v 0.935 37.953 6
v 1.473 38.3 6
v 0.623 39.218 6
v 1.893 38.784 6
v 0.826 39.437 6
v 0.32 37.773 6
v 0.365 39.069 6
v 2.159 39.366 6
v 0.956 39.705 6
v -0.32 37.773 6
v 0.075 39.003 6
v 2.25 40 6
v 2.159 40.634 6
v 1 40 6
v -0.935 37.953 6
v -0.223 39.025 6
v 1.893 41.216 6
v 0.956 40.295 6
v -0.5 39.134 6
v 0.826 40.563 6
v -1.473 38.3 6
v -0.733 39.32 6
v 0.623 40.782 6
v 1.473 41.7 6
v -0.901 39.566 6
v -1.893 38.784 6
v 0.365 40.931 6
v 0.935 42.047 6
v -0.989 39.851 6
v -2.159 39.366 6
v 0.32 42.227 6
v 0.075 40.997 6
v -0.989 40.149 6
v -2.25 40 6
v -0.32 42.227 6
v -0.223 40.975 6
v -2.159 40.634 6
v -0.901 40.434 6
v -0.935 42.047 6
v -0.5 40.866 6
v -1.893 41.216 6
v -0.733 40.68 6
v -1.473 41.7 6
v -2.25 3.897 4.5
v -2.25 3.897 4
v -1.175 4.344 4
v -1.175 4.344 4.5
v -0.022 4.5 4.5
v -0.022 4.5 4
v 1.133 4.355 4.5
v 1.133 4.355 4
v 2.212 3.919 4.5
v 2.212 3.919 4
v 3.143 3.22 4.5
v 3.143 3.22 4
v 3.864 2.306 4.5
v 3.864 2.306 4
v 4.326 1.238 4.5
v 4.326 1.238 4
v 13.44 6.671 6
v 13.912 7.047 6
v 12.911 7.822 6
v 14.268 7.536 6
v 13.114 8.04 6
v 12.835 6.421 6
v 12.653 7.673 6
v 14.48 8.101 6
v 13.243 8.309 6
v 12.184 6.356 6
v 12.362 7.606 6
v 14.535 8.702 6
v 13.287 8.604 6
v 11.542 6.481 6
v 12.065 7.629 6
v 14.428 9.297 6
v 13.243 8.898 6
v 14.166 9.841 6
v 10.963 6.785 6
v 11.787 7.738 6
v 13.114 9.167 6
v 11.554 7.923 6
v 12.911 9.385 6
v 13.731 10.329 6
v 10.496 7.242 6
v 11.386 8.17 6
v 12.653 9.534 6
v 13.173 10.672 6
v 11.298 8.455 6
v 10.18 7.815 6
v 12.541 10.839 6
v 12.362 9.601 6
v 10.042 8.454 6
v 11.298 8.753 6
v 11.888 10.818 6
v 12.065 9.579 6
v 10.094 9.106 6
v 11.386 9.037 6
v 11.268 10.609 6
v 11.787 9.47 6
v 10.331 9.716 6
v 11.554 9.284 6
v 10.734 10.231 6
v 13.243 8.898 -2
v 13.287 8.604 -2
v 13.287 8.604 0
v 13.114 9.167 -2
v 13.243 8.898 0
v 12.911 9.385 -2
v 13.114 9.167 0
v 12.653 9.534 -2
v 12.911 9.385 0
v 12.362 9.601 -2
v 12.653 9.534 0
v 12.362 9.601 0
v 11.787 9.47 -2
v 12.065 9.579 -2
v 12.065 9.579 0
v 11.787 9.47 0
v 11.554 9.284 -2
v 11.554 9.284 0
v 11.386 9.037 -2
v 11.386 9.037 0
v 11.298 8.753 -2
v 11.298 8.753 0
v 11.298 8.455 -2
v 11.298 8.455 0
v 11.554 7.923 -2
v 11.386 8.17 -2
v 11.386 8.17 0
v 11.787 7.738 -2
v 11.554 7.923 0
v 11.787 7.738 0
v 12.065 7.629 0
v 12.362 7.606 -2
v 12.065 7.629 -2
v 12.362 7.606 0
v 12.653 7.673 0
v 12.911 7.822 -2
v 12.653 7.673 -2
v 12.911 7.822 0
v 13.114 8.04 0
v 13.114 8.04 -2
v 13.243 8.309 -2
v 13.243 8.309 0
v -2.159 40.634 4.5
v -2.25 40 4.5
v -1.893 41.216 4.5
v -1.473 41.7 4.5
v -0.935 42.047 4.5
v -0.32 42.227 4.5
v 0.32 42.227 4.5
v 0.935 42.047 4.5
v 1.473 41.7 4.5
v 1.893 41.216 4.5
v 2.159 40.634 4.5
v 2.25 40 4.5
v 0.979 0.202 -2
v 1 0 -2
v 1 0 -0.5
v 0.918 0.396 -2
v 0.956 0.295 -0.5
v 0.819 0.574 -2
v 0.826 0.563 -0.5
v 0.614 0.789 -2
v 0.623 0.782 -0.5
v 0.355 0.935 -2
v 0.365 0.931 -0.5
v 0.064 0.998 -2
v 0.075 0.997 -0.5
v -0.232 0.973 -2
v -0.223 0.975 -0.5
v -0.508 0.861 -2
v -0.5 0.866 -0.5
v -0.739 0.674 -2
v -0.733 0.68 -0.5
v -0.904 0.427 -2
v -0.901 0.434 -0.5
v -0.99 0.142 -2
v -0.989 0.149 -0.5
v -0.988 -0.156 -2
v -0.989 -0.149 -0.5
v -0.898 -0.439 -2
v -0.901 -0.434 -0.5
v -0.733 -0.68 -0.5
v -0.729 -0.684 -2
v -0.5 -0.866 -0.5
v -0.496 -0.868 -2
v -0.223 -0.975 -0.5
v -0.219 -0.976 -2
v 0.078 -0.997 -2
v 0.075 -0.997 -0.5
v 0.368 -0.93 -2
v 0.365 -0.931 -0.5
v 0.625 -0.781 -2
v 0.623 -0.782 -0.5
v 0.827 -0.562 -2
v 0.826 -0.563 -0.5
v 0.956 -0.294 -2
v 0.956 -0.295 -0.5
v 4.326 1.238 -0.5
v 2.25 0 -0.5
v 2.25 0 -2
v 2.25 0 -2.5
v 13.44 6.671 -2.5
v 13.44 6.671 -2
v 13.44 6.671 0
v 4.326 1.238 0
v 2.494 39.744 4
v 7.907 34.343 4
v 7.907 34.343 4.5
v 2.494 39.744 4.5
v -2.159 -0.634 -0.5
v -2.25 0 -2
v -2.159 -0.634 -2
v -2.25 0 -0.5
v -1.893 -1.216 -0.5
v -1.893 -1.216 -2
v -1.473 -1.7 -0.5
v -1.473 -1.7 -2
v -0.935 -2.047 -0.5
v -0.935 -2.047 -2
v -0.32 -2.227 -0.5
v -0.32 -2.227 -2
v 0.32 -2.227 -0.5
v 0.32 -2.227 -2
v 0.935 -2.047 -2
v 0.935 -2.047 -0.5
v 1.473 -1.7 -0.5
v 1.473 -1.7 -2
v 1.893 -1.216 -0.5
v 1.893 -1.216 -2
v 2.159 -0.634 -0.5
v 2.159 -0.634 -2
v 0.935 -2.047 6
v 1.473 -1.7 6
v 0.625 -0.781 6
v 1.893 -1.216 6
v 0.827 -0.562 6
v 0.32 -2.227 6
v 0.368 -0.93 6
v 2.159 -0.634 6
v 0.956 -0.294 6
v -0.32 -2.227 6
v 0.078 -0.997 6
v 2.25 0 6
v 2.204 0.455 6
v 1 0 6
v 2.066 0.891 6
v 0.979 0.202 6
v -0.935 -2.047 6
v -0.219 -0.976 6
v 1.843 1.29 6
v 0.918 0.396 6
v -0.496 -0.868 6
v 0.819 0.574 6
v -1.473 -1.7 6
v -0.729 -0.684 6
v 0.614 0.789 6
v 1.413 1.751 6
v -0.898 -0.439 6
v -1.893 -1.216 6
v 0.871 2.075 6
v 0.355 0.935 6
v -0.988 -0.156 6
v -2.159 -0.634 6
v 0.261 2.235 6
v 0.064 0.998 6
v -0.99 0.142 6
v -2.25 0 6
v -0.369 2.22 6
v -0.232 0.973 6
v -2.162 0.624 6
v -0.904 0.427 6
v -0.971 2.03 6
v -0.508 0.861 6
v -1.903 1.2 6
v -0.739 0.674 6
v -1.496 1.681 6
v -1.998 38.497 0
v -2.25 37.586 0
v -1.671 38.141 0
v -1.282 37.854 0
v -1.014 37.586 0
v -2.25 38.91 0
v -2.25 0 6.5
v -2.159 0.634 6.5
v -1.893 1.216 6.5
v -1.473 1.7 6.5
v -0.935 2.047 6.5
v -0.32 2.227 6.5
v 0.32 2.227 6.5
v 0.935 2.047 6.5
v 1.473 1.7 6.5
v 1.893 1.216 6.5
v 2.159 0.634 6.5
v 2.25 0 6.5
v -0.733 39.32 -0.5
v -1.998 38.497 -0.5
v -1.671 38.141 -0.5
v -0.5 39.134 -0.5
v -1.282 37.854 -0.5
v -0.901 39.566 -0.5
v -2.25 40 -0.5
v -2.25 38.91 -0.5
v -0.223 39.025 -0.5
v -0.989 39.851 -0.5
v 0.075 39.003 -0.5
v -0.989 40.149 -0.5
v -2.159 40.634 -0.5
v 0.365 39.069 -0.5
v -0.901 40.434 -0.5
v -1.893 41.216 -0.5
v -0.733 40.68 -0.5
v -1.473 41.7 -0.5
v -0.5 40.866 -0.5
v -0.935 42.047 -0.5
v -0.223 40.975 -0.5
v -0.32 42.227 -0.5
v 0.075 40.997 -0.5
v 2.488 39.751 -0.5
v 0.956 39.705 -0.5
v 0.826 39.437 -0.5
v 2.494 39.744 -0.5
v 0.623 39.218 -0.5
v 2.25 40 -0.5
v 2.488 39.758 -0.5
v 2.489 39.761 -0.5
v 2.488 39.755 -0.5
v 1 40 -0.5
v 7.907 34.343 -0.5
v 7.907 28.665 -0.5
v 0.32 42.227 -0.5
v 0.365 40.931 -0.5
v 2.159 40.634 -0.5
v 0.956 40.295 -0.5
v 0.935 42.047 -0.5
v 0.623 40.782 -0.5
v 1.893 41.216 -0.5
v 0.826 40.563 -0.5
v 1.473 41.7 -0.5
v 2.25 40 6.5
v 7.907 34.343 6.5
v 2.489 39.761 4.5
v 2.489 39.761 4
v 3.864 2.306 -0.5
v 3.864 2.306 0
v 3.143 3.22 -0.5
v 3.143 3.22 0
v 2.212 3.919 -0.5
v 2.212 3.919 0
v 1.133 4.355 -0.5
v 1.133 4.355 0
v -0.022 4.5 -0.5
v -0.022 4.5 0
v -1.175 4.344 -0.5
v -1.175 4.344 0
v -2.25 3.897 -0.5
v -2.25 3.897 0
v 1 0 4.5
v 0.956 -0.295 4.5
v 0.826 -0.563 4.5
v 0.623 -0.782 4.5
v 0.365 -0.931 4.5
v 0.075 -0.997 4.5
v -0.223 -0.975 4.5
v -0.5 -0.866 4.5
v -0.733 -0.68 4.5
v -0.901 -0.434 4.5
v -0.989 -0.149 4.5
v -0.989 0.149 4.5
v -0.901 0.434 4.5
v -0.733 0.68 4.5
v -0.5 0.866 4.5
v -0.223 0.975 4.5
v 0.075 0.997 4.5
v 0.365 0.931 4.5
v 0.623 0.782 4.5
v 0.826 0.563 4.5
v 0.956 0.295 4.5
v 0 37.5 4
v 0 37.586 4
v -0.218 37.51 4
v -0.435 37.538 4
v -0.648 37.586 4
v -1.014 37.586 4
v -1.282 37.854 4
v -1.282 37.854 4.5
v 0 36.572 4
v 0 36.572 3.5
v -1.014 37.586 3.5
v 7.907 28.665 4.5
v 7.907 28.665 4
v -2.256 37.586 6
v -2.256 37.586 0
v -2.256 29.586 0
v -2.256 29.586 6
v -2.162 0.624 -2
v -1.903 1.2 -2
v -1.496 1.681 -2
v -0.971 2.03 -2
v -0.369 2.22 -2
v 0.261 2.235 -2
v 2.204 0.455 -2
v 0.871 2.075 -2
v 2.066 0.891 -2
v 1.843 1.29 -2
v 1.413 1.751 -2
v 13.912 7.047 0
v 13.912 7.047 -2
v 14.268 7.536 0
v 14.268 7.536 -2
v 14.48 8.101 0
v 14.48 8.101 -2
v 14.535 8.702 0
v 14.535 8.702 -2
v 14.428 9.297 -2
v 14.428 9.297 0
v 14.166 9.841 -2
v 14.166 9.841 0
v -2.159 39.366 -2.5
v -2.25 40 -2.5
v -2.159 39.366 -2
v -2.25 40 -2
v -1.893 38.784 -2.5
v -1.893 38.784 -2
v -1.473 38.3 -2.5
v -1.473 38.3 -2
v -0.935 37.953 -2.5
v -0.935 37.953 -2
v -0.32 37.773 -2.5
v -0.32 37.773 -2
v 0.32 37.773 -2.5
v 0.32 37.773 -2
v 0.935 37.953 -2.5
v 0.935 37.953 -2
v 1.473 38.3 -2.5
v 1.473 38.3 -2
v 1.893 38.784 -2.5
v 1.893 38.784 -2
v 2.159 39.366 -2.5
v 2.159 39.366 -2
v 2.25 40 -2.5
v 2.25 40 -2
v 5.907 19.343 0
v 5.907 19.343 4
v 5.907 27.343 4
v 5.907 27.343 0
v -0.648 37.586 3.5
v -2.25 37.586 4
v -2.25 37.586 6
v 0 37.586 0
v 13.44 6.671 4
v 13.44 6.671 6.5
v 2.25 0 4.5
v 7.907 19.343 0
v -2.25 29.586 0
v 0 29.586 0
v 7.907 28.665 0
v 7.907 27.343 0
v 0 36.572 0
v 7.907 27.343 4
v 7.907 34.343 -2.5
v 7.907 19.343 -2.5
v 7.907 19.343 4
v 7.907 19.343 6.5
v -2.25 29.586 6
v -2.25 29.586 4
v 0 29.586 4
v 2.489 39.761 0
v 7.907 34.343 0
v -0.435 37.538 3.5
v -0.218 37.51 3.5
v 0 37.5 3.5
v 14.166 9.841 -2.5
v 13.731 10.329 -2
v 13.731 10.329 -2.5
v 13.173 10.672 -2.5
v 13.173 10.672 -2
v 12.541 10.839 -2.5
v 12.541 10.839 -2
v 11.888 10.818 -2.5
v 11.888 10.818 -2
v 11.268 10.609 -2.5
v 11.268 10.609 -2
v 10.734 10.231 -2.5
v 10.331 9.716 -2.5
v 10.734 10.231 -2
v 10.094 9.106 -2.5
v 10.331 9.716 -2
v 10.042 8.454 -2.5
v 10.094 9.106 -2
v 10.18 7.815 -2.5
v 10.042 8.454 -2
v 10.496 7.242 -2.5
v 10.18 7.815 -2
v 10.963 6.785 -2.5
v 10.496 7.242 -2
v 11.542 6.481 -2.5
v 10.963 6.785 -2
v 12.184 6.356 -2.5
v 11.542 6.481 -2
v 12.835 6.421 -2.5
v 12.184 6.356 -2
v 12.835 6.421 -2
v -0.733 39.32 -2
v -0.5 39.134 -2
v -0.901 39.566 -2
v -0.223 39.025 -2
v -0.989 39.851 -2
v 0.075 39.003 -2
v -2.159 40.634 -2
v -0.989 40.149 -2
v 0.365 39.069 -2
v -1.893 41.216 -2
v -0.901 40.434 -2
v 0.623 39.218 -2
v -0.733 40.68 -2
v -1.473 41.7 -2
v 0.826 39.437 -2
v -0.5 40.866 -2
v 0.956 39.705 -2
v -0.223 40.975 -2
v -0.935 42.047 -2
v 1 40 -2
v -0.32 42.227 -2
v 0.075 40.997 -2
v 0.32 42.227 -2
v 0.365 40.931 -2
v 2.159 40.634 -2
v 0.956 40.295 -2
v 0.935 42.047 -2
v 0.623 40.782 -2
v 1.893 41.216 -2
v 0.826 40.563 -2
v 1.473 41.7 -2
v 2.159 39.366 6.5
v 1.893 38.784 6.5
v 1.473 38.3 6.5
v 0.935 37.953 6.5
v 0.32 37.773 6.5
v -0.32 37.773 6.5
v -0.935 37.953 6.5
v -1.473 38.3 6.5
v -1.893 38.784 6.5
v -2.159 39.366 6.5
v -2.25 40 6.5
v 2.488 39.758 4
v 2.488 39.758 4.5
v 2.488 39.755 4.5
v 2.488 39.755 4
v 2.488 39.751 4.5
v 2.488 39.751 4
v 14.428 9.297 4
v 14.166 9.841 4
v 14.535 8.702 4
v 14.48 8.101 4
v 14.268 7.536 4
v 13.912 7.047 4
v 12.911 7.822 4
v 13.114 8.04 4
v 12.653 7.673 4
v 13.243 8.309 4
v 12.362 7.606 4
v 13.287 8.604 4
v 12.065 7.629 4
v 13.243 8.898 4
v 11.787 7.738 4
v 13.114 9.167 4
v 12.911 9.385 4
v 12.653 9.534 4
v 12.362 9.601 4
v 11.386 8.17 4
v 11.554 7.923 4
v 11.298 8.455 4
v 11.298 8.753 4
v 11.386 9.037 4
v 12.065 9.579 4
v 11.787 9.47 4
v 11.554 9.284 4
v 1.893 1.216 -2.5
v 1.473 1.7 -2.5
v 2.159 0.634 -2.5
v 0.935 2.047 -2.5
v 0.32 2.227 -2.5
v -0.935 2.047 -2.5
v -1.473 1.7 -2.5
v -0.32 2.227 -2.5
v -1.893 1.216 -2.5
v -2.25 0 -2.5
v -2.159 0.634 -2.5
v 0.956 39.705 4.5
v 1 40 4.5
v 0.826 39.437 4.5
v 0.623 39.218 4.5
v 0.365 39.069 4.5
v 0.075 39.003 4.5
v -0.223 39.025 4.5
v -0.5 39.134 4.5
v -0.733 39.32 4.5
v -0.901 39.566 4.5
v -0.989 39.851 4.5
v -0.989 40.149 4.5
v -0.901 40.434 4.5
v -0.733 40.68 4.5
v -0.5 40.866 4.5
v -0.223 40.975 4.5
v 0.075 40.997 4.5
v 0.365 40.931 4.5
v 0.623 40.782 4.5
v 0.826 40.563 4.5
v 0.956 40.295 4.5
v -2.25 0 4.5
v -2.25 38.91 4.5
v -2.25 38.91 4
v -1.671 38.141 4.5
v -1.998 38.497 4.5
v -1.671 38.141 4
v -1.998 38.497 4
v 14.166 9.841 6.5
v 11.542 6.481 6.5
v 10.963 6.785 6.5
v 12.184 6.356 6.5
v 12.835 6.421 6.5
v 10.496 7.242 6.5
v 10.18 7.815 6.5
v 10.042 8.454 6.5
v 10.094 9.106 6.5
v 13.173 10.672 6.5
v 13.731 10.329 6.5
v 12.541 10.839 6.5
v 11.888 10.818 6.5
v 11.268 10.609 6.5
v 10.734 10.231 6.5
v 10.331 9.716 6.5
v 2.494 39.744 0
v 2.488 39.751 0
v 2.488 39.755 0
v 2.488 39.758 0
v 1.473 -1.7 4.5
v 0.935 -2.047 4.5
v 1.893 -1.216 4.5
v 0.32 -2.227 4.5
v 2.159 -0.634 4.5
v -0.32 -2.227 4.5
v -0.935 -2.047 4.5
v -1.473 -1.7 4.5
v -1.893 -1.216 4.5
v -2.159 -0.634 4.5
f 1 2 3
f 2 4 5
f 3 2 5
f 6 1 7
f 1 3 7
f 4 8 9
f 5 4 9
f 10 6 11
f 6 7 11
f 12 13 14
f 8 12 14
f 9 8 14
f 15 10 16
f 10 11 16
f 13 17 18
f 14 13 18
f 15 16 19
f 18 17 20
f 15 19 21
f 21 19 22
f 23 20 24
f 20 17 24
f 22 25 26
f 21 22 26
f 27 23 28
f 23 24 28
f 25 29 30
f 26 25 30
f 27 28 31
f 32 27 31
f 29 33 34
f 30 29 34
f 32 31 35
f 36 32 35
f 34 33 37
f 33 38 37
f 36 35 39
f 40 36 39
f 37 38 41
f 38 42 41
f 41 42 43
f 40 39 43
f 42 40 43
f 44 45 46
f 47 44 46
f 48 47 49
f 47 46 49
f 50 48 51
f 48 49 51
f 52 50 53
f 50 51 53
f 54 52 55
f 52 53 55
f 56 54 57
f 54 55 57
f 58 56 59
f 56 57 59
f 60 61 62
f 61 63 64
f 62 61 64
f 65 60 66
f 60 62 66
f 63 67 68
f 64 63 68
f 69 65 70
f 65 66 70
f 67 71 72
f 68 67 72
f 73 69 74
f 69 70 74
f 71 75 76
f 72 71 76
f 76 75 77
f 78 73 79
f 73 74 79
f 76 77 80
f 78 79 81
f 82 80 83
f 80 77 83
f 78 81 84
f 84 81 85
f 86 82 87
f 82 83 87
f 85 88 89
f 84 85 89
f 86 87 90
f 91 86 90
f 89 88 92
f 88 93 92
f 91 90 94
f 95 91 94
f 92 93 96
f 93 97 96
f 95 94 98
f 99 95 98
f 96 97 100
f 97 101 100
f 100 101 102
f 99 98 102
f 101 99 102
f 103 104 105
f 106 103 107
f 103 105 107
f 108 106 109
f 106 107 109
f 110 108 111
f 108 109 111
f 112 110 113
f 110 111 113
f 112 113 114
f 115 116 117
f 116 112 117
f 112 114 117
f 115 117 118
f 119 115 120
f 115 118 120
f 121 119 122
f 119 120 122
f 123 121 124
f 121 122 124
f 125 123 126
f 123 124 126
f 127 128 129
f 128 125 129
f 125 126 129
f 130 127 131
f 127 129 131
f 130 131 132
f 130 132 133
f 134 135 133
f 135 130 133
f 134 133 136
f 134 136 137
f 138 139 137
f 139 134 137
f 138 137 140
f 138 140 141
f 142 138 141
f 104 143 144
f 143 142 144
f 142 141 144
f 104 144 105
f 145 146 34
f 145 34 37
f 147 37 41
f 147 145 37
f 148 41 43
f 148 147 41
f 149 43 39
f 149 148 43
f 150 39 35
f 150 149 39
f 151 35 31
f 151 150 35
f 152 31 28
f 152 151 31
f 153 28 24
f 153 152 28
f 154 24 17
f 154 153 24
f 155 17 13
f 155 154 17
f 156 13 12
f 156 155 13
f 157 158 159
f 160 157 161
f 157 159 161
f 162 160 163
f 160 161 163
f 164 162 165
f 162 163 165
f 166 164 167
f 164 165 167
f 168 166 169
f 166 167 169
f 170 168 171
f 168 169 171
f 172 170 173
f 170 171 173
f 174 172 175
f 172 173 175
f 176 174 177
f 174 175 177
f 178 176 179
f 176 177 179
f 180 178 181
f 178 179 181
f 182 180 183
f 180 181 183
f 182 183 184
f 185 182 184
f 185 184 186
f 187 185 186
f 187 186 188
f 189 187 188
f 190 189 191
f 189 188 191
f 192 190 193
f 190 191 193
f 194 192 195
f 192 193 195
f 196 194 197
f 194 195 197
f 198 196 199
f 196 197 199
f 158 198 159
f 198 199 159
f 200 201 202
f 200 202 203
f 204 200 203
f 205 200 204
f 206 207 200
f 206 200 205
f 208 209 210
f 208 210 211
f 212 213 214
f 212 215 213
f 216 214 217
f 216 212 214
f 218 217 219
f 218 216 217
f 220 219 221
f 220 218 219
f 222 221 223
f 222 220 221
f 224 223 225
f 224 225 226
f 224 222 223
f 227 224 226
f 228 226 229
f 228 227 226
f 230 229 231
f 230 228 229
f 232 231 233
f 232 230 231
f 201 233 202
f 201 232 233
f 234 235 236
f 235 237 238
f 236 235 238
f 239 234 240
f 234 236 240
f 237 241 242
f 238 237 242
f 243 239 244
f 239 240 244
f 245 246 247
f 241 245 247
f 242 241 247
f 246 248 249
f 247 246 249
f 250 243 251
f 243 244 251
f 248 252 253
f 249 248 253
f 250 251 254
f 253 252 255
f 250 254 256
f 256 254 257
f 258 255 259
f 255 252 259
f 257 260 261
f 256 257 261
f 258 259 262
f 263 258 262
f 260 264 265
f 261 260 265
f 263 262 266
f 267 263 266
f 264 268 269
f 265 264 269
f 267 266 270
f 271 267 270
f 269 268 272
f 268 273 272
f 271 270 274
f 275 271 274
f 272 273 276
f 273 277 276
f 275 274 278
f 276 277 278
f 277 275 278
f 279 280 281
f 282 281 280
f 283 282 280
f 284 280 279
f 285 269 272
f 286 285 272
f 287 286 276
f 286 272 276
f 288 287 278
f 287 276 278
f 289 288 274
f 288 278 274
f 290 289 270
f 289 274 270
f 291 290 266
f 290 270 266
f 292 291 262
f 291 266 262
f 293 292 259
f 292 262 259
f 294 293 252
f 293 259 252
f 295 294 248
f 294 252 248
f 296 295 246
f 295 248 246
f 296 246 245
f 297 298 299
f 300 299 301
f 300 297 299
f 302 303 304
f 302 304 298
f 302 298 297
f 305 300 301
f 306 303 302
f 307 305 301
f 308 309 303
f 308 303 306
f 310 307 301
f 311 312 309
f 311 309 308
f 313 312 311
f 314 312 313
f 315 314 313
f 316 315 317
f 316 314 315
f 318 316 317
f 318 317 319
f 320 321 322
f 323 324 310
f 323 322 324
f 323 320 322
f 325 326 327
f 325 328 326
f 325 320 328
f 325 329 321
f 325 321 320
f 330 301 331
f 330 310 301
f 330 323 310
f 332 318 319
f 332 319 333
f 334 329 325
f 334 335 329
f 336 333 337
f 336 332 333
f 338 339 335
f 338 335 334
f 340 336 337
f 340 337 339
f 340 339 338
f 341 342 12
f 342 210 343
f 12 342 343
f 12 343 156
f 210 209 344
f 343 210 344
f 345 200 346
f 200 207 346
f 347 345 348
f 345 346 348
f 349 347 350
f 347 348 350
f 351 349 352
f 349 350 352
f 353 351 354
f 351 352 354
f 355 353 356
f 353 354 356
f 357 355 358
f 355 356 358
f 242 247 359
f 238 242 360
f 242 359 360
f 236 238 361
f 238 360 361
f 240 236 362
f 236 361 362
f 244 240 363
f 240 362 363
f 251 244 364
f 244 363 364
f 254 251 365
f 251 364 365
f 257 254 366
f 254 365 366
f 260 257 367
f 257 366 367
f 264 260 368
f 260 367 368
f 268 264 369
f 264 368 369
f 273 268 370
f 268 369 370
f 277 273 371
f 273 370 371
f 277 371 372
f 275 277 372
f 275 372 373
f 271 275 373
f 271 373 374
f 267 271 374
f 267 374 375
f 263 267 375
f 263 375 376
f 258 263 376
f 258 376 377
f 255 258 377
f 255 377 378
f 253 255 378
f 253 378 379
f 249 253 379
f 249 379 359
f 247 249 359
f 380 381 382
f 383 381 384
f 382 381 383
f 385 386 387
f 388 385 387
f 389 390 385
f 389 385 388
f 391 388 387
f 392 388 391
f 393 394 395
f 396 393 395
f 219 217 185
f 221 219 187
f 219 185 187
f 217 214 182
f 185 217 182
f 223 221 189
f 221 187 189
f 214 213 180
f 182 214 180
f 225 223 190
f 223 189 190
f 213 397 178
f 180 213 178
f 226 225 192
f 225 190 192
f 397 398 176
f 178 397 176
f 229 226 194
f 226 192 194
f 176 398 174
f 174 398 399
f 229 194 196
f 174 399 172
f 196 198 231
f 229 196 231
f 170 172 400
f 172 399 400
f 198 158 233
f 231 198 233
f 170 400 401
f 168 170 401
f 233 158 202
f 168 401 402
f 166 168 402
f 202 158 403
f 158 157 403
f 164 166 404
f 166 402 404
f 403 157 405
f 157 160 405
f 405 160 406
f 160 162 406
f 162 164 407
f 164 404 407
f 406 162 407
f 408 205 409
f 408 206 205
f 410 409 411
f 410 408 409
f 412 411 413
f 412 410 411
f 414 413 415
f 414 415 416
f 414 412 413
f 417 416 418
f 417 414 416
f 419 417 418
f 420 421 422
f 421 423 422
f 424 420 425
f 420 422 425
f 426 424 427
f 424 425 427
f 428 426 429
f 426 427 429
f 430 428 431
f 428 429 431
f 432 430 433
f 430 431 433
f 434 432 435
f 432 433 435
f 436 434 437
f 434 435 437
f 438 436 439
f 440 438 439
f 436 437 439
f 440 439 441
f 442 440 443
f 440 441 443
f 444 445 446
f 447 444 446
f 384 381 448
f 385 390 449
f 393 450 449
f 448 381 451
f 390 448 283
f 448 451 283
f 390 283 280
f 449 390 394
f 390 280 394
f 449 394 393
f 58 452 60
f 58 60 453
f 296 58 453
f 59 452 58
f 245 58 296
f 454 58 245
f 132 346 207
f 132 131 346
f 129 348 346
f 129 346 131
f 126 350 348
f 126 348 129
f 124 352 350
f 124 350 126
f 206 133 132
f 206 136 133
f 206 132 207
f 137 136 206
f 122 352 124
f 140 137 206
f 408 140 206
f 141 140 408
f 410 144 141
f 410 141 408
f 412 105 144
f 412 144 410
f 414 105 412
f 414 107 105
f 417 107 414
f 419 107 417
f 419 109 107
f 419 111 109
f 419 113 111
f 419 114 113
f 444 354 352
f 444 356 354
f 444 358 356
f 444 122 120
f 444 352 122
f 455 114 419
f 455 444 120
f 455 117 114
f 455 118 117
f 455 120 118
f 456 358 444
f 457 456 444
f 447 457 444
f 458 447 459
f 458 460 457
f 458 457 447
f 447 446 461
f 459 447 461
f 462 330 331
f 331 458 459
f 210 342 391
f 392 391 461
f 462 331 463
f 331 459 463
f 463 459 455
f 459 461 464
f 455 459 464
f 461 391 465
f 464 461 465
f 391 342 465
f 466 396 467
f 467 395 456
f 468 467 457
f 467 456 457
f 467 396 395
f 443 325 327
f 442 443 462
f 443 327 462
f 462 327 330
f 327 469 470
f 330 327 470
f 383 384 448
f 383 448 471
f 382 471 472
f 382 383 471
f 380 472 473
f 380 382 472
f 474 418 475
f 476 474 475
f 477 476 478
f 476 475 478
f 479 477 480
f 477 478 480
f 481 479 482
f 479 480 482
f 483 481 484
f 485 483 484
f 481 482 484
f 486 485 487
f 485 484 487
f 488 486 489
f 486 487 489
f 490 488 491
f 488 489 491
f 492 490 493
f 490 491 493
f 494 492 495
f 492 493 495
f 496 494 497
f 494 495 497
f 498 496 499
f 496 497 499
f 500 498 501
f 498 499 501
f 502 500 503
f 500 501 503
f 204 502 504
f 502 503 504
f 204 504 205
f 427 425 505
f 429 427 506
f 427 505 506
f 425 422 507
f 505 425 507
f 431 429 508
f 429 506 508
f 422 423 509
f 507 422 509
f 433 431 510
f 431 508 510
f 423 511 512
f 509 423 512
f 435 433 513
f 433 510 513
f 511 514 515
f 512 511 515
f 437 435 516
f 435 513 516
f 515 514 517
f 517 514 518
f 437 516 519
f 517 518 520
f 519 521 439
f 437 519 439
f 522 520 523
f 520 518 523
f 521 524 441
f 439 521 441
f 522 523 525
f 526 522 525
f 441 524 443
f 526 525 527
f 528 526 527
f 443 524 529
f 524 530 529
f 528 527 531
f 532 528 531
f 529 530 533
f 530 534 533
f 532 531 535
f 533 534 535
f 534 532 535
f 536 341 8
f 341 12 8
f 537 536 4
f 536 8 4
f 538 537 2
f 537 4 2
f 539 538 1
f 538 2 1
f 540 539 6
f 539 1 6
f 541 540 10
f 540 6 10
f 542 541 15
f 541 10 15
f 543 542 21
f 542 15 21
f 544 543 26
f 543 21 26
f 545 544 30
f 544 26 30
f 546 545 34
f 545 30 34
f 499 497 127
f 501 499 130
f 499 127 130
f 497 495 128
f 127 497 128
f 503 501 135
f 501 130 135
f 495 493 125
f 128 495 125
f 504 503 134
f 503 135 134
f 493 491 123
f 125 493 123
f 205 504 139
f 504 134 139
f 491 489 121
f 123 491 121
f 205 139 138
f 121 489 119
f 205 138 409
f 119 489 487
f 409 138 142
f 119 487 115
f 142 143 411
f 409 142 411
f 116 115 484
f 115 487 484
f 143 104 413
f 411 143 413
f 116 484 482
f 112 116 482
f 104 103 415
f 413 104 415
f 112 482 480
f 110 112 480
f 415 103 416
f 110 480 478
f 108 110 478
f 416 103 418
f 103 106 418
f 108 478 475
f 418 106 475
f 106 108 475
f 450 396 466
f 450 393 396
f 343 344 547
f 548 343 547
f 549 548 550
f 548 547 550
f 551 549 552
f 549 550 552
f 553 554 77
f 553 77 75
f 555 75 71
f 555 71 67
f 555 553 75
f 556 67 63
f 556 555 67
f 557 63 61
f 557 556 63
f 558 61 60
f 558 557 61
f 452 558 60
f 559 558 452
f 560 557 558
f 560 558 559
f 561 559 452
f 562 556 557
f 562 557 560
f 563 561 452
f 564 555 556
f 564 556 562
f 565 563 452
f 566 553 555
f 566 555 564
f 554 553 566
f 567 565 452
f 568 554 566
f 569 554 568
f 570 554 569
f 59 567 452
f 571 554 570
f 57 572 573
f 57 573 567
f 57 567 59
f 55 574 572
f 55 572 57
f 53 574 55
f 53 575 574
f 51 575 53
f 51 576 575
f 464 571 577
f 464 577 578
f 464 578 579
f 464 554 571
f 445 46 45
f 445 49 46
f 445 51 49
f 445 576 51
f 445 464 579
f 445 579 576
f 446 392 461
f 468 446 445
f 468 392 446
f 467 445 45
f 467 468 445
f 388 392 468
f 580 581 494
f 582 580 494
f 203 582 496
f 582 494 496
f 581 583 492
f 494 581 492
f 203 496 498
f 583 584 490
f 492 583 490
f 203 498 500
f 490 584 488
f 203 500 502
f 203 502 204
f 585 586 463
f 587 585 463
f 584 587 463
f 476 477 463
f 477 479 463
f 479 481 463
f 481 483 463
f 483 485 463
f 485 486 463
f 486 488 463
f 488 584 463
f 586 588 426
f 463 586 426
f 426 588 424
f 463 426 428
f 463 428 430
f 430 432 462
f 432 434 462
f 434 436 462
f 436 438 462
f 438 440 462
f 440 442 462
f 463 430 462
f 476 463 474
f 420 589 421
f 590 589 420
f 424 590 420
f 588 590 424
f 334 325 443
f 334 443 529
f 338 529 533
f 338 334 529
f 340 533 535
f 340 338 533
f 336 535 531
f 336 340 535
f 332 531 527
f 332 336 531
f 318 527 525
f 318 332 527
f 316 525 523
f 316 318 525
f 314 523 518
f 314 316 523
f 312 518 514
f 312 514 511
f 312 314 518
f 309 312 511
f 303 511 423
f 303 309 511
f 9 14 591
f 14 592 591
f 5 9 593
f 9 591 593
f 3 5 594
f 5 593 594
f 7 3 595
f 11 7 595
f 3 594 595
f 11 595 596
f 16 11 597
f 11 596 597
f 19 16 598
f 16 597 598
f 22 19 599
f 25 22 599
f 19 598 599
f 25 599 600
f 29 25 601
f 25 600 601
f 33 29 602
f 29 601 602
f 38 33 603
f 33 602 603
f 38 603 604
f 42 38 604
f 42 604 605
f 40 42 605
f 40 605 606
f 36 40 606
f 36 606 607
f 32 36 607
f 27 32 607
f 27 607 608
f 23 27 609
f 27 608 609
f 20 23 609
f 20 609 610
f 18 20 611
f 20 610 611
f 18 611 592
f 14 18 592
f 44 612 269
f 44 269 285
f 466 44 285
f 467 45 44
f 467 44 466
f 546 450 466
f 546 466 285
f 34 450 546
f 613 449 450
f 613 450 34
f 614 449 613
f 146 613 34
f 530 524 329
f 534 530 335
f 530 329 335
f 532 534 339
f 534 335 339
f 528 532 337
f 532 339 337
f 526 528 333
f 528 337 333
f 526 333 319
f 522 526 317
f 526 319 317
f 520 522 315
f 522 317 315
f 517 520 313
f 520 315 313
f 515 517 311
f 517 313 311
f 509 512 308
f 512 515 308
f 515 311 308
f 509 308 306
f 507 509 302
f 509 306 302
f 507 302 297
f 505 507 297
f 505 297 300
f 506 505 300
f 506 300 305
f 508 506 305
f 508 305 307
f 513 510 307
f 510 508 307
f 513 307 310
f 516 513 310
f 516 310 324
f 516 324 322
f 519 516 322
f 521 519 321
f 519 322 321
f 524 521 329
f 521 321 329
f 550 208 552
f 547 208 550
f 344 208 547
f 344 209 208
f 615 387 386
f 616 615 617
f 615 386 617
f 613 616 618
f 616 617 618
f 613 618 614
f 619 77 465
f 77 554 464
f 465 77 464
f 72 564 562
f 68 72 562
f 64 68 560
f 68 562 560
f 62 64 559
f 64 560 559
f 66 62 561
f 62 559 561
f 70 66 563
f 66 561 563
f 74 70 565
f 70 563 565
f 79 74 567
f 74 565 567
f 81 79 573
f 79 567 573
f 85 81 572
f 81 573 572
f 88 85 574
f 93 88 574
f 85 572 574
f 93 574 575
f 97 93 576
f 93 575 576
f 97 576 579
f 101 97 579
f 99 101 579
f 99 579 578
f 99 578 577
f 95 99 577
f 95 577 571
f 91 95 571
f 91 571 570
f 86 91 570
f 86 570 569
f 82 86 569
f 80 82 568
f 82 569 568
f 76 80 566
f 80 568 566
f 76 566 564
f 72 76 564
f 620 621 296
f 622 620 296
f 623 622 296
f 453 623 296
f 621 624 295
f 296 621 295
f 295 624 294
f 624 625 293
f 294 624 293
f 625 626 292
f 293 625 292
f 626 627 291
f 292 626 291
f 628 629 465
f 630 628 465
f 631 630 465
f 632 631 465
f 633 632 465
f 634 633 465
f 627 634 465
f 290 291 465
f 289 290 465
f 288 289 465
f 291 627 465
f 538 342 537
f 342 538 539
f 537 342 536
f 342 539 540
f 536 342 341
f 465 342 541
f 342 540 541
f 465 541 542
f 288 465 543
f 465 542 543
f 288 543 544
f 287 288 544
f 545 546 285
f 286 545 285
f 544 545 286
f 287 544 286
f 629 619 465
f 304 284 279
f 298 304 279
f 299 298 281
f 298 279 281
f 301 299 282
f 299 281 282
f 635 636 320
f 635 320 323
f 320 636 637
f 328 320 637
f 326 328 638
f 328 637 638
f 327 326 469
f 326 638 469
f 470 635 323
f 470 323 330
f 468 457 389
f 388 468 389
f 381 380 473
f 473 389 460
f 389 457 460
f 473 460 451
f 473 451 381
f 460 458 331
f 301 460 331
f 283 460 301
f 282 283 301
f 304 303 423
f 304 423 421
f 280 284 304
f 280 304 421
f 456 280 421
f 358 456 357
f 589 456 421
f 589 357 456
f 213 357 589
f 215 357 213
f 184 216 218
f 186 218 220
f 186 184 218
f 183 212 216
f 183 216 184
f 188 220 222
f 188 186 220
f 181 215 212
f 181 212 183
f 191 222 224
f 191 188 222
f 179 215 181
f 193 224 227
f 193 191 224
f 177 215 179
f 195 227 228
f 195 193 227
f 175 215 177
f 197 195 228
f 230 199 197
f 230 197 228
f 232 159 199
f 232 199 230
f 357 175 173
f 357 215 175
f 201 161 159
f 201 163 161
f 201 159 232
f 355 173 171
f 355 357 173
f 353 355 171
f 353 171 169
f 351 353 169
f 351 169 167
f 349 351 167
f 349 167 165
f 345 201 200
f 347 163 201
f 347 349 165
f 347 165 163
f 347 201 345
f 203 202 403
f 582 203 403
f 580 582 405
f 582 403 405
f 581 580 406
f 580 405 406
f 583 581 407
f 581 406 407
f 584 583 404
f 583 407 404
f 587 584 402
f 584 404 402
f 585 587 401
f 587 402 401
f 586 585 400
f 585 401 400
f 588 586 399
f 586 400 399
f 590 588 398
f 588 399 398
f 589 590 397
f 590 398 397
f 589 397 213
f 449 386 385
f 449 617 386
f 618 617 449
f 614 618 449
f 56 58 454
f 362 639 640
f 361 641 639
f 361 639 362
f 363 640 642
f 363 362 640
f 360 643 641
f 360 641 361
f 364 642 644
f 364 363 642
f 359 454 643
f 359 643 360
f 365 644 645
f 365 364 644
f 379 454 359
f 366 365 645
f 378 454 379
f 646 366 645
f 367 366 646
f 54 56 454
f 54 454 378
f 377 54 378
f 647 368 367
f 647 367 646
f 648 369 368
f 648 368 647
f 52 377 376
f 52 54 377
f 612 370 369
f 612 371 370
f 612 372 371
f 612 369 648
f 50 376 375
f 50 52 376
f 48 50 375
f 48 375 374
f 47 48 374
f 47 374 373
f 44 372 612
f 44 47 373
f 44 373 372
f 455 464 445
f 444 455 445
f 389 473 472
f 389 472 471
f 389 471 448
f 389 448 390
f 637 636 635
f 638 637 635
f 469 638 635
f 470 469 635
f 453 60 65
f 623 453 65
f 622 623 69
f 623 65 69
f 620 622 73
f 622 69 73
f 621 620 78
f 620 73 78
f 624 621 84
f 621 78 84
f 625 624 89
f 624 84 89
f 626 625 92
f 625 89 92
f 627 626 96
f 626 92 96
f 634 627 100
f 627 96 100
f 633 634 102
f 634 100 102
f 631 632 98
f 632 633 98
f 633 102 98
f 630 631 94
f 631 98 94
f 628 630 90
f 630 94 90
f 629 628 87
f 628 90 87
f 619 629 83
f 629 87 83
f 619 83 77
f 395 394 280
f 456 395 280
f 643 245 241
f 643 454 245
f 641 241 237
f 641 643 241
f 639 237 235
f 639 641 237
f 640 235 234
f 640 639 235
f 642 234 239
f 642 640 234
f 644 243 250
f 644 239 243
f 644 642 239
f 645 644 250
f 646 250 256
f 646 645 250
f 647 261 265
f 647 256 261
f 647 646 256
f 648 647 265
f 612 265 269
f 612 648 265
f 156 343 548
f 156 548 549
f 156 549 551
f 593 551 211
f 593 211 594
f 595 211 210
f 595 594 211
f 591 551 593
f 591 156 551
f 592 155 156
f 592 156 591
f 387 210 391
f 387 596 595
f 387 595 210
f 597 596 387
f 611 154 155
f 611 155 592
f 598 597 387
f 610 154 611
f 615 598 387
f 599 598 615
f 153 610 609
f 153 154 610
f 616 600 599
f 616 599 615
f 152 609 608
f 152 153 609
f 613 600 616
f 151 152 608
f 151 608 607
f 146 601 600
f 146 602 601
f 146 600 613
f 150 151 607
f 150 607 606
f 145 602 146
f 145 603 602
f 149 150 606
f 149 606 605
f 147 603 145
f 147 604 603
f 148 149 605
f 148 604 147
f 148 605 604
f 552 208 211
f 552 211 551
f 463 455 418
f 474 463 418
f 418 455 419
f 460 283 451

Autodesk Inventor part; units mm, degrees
ref_plane "YZ Plane" through (0, 0, 0) normal (1, 0, 0) x (0, 1, 0)
sketch "Sketch1" plane through (0, 0, 0) normal (0, 0, 1) x (1, 0, 0)
  circle A0 centre (0, 0) radius 1
  circle A1 centre (0, 0) radius 2.25
  circle A2 centre (0, 40) radius 1
  circle A3 centre (0, 40) radius 2.25
  line L0 (-2.25, 40) -> (-2.25, 0)
  line L1 (0, 0) -> (15, 0) construction
  line L2 (12.2873, 8.6036) -> (11.2873, 8.6036)
  circle A4 centre (12.2873, 8.6036) radius 1
  circle A5 centre (12.2873, 8.6036) radius 2.25
  line L3 (2.25, 0) -> (13.4395, 6.671)
  line L4 (2.25, 40) -> (7.9069, 34.3431)
  line L5 (7.9069, 34.3431) -> (7.9069, 19.3431)
  line L6 (7.9069, 19.3431) -> (14.1662, 9.8414)
  line L7 (0, 0) -> (0, 1)
  line L8 (0, 39) -> (0, 40)
  line L9 (0, 0) -> (1.8431, 1.2905)
  line L10 (11.4681, 8.0301) -> (12.2873, 8.6036)
  dimension "d5" = 2
  dimension "d7" = 2
  dimension "d0" = 40
  dimension "d6" = 4.5
  dimension "d8" = 4.5
  dimension "d9" = 15
  dimension "d11" = 2
  dimension "d12" = 4.5
  dimension "d13" = 8
  dimension "d15" = 15
ref_plane "Work Plane1" through (0, 0, 2) normal (0, 0, 1) x (1, 0, 0)
extrude "Extrusion1" add sketch "Sketch1" against normal blind 2.5 contours A1 L0 A3 L4 L5 L6 A5 L3
extrude "Extrusion2" add sketch "Sketch1" against normal blind 2 contours A1 | A5 | A3
mirror "Mirror1" about plane through (0, 0, 2) normal (0, 0, 1) of "Extrusion1", "Extrusion2"
sketch "Sketch2" plane through (0, 0, 0) normal (0, 0, 1) x (1, 0, 0)
  line L0 (0, 37.5855) -> (-2.2556, 37.5855)
  line L1 (-2.2556, 37.5855) -> (-2.2556, 29.5855)
  line L2 (-2.2556, 29.5855) -> (0, 29.5855)
  line L3 (0, 29.5855) -> (0, 37.5855)
  point P0 (0, 0)
  dimension "d21" = 8
extrude "Extrusion3" add sketch "Sketch2" along normal blind 6
sketch "Sketch3" plane through (0, 0, 6.5) normal (0, 0, 1) x (1, 0, 0)
  line L0 (7.9069, 19.3431) -> (5.9069, 19.3431)
  line L1 (5.9069, 19.3431) -> (5.9069, 27.3431)
  line L2 (5.9069, 27.3431) -> (7.9069, 27.3431)
  line L3 (7.9069, 27.3431) -> (7.9069, 19.3431)
  point P0 (0, 0)
  dimension "d24" = 2
  dimension "d25" = 8
extrude "Extrusion4" add sketch "Sketch3" against normal blind 9
sketch "Sketch6" plane through (0, 0, 4) normal (0, 0, -1) x (-1, 0, 0)
  circle A0 centre (0, 0) radius 4.5
  dimension "d33" = 9
extrude "Extrusion7" cut sketch "Sketch6" against normal blind 0.5
sketch "Sketch7" plane through (0, 0, 0) normal (0, 0, 1) x (1, 0, 0)
  circle A0 centre (0, 0) radius 4.5
  dimension "d36" = 9
extrude "Extrusion8" cut sketch "Sketch7" against normal blind 0.5
sketch "Sketch8" plane through (0, 40, 4) normal (0, 0, -1) x (-1, 0, 0)
  circle A0 centre (0, 0) radius 2.5
  circle A1 centre (0, 0) radius 2.5
  line L0 (-7.9069, -5.6569) -> (-2.4944, -0.2556)
  arc A2 (-2.4876, -0.2488) -> (-1.7678, -1.7678) centre (0, 0) ccw
  arc A3 (-2.4876, -0.2488) -> (-1.7678, -1.7678) centre (0, 0) ccw
  line L1 (-7.9069, -5.6569) -> (-2.4876, -0.2488)
  line L2 (-7.9069, -5.6569) -> (-7.9069, -7.9069)
  line L3 (1.2823, -2.1461) -> (-7.9069, -11.3352)
  line L4 (-7.9069, -12.6569) -> (-7.9069, -5.6569) projected
  point P0 (0, -40)
  dimension "d39" = 5
extrude "Extrusion9" cut sketch "Sketch8" against normal blind 0.5
ref_plane "Work Plane2" through (0, 0, 2) normal (0, 0, -1) x (-1, 0, 0)
mirror "Mirror2" about plane through (0, 0, 2) normal (0, 0, -1) of "Extrusion9"
extrude "Extrusion10" cut sketch "Sketch8" along normal blind 0.5 contours A0 L3 L4 L2 L0 L1
mirror "Mirror3" about plane through (0, 0, 2) normal (0, 0, -1) of "Extrusion9"
properties part number "Pinky_Lower_main_1"
